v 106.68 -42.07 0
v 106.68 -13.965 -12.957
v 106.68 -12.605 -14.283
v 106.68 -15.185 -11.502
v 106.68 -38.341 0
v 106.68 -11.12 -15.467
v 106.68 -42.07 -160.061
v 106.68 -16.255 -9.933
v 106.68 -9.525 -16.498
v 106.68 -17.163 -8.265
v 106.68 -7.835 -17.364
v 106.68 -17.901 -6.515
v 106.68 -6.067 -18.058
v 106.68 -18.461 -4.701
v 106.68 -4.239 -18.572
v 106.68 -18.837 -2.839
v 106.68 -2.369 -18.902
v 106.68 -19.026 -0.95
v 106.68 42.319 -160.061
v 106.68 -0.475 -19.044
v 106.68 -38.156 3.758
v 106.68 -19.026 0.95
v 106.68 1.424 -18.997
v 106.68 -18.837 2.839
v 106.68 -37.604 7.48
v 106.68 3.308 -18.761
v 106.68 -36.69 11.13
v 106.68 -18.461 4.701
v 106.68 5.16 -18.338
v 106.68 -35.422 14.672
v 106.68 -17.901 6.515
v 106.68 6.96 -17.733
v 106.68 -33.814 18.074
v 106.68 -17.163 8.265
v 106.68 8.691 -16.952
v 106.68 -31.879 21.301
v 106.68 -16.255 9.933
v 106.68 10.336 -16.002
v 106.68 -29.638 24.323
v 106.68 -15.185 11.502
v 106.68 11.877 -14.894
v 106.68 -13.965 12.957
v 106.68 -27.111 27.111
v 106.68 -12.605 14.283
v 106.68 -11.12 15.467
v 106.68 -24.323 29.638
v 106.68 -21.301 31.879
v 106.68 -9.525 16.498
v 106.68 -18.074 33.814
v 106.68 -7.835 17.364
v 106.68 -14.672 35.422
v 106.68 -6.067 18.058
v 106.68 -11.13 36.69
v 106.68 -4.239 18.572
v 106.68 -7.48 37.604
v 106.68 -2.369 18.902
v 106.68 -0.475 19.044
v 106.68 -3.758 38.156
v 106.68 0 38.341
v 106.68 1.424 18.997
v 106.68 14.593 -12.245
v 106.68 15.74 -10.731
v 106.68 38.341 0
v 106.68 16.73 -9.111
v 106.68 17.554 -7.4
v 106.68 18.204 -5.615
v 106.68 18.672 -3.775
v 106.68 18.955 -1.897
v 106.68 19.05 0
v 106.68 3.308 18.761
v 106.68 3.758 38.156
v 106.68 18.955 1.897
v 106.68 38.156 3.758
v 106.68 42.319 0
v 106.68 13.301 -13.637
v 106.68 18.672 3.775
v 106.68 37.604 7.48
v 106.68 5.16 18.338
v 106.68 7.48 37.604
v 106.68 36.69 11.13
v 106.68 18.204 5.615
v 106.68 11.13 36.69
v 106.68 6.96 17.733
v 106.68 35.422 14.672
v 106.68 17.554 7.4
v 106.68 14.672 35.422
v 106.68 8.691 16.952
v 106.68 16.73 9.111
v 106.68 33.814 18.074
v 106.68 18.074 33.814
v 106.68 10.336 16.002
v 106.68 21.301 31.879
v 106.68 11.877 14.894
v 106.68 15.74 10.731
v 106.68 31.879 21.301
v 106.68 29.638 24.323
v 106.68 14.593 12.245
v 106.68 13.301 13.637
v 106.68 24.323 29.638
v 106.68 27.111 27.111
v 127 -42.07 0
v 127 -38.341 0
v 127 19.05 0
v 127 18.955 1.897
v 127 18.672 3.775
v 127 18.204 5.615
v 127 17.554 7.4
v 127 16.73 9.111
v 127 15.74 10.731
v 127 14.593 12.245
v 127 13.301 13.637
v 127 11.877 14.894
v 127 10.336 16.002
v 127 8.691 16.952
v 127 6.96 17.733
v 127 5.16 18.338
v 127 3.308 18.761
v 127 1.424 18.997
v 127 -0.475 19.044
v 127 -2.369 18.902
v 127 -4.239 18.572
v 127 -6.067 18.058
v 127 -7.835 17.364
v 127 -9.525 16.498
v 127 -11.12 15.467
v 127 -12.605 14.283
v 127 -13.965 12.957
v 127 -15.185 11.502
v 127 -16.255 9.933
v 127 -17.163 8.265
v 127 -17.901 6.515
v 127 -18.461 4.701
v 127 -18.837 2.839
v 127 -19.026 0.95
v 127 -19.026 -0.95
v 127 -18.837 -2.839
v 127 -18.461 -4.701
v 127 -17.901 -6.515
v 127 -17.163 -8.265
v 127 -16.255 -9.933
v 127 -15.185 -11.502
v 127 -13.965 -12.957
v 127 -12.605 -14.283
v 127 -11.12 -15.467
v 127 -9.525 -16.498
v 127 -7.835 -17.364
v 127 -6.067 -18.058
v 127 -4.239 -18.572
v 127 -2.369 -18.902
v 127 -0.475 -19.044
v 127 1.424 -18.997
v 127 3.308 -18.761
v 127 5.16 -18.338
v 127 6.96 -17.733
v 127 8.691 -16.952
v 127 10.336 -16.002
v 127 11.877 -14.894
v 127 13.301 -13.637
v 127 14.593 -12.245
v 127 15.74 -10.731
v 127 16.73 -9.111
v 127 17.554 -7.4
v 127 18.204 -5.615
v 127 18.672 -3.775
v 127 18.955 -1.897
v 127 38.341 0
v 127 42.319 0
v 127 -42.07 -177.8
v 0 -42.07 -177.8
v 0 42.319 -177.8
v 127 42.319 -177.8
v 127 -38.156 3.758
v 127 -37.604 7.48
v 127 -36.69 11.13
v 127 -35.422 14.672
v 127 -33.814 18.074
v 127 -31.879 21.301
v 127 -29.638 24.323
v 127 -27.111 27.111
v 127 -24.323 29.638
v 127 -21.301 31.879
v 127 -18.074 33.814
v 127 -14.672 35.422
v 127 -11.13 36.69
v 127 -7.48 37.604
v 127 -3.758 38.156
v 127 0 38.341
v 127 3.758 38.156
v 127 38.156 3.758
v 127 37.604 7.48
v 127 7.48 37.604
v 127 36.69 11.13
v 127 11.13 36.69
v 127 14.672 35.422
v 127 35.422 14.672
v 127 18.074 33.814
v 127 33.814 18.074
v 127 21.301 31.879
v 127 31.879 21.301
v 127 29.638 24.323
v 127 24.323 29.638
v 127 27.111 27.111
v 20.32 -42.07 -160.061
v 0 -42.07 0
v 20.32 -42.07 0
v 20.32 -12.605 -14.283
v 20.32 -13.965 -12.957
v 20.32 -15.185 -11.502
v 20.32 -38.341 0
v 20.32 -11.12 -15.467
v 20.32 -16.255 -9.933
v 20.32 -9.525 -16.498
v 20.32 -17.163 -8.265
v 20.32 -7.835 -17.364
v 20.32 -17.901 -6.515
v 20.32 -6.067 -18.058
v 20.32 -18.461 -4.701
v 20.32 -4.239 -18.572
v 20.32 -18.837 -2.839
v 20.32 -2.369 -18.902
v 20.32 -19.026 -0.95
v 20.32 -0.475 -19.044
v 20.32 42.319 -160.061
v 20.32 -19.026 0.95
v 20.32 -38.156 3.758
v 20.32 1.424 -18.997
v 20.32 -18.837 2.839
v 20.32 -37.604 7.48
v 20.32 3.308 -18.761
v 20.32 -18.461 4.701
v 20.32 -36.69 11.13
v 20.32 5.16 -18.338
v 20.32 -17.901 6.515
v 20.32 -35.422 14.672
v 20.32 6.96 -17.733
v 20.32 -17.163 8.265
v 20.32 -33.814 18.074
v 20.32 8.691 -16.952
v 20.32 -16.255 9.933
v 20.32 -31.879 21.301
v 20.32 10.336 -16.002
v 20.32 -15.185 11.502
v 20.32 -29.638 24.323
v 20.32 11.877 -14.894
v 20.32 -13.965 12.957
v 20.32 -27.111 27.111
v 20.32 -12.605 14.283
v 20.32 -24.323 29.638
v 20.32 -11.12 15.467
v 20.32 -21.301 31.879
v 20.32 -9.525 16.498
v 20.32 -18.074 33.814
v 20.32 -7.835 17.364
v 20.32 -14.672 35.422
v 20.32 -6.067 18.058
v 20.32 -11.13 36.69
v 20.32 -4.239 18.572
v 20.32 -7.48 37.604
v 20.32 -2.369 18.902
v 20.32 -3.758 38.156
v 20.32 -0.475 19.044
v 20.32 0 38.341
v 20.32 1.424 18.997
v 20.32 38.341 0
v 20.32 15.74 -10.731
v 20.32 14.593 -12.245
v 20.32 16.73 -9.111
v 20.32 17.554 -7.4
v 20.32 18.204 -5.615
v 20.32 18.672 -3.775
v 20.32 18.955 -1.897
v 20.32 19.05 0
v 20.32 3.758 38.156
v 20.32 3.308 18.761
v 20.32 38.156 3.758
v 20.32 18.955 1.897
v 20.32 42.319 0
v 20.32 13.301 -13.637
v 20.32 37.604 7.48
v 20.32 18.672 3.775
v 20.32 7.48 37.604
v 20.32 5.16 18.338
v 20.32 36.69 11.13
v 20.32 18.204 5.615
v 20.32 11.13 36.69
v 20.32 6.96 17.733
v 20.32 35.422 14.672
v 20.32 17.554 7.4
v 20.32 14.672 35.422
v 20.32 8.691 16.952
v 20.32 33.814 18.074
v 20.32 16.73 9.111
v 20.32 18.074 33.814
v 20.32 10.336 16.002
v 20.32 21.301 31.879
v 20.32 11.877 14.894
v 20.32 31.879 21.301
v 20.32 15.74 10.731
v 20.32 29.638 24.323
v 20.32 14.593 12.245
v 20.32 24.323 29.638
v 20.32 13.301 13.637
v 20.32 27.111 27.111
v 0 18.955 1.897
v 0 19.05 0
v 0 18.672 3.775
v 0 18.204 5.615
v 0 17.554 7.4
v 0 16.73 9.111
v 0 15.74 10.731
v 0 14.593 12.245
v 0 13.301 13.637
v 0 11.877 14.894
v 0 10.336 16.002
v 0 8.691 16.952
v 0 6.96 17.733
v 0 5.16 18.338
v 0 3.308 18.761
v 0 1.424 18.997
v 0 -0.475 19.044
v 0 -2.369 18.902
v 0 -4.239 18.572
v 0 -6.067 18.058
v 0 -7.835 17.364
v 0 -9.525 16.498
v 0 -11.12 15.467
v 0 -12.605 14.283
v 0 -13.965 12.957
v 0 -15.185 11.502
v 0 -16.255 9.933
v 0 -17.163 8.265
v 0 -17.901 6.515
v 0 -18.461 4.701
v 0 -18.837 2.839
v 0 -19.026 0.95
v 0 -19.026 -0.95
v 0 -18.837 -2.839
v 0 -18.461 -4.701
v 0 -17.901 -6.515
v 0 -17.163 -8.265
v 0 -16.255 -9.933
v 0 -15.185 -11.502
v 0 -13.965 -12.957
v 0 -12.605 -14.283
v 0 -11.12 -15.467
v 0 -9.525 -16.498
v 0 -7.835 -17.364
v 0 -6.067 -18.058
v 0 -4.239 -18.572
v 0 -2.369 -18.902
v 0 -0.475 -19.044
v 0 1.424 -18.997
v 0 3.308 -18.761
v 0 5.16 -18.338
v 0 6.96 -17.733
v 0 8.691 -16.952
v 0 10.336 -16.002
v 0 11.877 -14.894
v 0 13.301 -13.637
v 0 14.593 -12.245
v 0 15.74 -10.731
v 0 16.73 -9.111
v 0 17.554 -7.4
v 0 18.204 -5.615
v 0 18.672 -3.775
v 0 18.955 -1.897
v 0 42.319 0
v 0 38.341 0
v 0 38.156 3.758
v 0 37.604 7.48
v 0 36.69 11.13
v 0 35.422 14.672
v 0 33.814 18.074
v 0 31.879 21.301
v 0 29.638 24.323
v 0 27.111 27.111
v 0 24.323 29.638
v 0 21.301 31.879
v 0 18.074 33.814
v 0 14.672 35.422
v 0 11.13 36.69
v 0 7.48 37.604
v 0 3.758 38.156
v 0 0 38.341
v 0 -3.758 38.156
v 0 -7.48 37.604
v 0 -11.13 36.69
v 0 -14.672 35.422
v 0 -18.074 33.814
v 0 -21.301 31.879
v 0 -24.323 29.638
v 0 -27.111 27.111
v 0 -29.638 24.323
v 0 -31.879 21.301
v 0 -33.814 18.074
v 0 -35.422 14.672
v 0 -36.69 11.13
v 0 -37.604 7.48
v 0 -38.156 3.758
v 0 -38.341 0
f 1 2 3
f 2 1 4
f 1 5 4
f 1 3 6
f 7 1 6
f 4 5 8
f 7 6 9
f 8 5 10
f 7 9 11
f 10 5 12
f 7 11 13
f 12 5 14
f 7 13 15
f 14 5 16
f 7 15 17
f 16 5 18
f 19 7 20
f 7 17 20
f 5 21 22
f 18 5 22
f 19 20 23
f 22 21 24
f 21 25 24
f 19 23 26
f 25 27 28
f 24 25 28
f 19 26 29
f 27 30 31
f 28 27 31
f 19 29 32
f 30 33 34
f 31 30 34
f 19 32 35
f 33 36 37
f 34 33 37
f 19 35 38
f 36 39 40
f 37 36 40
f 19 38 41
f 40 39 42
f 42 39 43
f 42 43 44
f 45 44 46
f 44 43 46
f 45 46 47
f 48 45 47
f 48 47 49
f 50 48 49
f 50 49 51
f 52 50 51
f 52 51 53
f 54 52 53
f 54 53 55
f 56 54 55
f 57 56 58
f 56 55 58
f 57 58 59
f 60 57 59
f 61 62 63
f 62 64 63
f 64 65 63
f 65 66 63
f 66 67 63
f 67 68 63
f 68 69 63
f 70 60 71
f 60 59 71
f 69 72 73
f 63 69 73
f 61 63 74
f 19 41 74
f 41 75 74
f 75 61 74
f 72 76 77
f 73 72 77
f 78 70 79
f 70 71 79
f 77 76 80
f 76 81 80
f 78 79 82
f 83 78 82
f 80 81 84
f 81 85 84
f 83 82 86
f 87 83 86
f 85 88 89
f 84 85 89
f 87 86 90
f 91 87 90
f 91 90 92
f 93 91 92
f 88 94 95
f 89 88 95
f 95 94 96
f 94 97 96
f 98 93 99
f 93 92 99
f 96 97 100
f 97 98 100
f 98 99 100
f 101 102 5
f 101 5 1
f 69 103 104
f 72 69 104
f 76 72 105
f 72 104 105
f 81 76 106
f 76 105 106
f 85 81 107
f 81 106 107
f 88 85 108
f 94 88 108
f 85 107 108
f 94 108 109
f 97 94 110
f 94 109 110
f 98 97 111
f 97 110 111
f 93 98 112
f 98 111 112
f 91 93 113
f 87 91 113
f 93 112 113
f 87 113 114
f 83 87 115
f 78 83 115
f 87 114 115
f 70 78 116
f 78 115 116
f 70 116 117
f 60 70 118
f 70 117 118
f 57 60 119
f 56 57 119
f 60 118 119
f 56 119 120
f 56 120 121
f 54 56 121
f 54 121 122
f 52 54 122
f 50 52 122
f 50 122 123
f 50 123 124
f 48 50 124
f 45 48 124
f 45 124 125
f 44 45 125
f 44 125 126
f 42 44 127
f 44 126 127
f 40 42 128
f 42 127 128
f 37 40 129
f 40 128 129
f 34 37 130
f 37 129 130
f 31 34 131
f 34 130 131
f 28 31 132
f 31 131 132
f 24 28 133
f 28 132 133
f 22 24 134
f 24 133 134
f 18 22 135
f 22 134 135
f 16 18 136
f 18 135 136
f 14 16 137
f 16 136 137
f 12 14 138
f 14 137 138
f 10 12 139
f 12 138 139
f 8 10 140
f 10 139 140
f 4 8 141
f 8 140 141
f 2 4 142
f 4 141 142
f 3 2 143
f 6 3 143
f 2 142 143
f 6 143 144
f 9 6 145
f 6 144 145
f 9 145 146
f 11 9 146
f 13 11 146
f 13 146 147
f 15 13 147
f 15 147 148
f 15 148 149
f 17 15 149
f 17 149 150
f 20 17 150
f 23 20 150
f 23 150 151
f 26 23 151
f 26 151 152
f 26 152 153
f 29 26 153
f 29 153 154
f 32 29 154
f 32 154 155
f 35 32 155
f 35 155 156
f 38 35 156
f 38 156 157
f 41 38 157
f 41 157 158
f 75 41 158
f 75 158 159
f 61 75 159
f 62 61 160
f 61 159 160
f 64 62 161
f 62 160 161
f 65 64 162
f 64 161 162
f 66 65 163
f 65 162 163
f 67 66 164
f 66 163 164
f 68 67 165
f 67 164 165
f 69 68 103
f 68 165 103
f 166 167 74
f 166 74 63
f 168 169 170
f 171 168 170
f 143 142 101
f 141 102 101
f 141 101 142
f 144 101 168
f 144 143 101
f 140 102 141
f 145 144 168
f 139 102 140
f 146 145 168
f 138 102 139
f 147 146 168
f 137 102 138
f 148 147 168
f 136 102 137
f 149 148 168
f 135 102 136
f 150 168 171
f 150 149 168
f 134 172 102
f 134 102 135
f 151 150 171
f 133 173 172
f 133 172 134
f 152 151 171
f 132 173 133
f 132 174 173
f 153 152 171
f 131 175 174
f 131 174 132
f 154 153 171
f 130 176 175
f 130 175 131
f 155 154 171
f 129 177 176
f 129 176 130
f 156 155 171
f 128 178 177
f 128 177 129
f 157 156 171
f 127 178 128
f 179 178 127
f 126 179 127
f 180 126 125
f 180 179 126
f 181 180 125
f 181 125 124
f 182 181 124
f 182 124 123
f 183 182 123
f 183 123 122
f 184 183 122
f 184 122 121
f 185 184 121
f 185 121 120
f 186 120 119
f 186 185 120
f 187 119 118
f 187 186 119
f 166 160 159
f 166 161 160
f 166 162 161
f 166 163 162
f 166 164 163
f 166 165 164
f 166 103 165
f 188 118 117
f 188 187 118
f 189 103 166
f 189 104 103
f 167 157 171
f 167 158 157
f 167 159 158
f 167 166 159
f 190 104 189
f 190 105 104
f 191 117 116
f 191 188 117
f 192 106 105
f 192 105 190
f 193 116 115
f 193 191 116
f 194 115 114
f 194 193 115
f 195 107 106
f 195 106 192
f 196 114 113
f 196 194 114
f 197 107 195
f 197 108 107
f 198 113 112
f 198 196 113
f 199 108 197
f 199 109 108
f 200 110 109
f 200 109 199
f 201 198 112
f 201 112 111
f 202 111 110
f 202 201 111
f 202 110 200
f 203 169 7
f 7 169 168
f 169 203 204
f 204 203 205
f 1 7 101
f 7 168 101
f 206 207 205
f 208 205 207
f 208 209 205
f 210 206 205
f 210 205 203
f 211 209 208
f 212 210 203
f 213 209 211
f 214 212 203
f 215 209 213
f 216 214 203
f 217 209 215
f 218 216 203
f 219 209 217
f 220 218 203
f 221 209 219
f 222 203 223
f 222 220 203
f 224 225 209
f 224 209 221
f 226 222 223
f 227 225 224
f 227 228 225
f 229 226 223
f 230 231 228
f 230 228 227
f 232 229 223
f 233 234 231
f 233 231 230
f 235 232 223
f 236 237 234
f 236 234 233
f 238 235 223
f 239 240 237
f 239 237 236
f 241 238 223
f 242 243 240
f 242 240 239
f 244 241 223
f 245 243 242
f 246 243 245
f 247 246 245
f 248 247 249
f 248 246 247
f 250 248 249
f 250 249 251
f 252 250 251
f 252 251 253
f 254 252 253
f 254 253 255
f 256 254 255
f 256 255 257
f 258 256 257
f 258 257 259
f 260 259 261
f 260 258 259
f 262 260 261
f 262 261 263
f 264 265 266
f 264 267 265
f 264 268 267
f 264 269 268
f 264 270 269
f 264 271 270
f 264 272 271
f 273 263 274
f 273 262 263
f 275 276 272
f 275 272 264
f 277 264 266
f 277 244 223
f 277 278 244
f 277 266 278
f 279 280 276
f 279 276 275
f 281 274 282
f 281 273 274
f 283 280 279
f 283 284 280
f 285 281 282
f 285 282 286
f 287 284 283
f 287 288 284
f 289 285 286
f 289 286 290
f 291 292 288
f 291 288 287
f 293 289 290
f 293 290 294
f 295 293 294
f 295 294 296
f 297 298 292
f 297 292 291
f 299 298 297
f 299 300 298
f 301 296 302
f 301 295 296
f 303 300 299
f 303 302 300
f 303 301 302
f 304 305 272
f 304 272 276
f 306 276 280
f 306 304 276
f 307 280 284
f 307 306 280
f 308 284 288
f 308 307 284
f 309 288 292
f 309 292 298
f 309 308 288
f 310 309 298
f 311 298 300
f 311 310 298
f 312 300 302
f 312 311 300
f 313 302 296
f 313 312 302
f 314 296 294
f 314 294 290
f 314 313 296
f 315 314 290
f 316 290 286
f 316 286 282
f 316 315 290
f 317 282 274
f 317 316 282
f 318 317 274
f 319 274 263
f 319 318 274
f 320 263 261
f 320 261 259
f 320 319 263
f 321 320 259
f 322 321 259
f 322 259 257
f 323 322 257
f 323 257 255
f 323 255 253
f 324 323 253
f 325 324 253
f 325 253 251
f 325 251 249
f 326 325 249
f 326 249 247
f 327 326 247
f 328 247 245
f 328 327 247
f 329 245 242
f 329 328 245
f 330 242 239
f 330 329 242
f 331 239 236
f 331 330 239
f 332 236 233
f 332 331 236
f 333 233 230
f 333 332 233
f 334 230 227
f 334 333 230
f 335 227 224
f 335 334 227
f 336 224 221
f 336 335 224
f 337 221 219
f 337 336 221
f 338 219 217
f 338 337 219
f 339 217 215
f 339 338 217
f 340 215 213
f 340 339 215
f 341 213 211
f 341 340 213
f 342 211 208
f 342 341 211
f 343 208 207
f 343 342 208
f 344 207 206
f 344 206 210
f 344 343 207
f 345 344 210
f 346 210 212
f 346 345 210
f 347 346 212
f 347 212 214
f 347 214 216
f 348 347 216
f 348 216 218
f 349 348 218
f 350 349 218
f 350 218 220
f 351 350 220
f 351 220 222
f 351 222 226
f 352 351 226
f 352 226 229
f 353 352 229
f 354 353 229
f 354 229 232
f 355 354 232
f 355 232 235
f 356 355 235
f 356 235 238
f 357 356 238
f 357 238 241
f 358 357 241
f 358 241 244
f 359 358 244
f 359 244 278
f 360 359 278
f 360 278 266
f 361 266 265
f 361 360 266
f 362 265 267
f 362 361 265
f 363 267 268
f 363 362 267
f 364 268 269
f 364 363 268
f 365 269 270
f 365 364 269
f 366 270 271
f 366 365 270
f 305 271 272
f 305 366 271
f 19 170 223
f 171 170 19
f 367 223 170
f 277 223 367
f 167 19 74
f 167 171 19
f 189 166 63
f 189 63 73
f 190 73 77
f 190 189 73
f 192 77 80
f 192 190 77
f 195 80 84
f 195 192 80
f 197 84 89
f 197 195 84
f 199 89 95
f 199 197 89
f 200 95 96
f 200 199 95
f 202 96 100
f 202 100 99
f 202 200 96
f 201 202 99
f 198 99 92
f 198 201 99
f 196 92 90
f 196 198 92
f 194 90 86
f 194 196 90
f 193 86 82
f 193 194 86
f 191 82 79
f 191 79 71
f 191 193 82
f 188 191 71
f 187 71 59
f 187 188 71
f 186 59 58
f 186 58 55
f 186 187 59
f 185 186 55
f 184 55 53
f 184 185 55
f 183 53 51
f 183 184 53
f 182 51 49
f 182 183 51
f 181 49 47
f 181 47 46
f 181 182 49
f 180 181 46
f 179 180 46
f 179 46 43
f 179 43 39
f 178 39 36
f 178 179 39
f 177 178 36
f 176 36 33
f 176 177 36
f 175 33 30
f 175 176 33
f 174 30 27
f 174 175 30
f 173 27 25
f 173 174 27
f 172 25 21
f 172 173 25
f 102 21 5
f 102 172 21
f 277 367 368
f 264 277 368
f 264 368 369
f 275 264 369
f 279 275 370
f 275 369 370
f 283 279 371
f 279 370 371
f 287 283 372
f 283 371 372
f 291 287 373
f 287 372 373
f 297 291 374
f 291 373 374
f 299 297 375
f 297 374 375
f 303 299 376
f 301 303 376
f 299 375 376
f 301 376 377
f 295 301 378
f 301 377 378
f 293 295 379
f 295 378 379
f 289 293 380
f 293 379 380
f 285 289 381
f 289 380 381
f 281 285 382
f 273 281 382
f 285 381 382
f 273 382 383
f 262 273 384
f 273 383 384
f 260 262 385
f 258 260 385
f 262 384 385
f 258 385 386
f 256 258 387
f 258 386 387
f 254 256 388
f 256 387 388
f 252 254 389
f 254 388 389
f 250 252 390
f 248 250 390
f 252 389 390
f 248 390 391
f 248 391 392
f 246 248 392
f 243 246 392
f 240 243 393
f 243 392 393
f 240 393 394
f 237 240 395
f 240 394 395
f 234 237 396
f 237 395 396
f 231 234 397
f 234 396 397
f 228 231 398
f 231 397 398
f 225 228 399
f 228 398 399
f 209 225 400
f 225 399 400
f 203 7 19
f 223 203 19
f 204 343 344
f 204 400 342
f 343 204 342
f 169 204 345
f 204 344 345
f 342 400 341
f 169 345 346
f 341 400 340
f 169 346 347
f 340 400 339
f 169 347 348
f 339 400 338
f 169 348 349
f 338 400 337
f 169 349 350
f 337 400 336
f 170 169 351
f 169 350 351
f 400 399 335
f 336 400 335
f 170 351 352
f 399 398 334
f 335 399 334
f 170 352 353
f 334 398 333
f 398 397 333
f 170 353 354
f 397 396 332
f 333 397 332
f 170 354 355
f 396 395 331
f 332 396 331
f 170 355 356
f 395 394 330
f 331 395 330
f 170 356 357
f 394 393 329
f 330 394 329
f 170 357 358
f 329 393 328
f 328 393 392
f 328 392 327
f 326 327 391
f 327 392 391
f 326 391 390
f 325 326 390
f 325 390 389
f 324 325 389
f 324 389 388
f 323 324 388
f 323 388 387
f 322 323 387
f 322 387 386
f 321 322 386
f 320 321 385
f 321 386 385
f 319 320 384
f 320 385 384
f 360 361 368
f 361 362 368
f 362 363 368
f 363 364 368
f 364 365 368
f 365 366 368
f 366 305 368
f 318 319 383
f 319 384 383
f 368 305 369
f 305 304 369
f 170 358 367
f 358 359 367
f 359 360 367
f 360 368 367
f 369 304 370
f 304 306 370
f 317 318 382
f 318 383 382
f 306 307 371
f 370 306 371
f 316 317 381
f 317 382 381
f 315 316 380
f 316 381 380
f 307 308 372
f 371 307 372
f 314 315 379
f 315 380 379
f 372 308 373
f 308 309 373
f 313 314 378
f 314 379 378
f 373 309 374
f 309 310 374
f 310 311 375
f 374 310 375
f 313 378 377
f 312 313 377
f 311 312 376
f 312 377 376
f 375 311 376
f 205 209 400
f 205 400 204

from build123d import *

# Parameters (mm, degrees)
F0_R     = 19.05
F1_DEPTH = 20.32
F2_W     = 84.38881
F2_H     = 17.738584
F3_DEPTH = 43.18


with BuildPart() as f1:
    # F0 (on Right) → F1 (new body)
    with BuildSketch(Plane.YZ):
        with BuildLine():
            Line((-38.34097, 0), (-42.069936, 0))
            Line((-42.069936, 0), (-42.069936, -177.8))
            Line((-42.069936, -177.8), (42.318874, -177.8))
            Line((42.318874, -177.8), (42.318874, 0))
            Line((42.318874, 0), (38.34097, 0))
            ThreePointArc((38.34097, 0), (0, 38.34097), (-38.34097, 0))
        make_face()
        Circle(F0_R, mode=Mode.SUBTRACT)
    extrude(amount=F1_DEPTH)

    # F2 (on face) → F3 (join)
    with BuildSketch(Plane.YZ.offset(20.32)):
        with Locations((0.124469, -168.930708)):
            Rectangle(F2_W, F2_H)
    extrude(amount=F3_DEPTH)

    # F4: F1 across face


with BuildPart() as f1_1:
    add(f1.part)
    add(f1.part.mirror(Plane(origin=(63.5, 0.124469, -168.930708), x_dir=(0, 1, 0), z_dir=(1, 0, 0))))


solid = f1_1.part
